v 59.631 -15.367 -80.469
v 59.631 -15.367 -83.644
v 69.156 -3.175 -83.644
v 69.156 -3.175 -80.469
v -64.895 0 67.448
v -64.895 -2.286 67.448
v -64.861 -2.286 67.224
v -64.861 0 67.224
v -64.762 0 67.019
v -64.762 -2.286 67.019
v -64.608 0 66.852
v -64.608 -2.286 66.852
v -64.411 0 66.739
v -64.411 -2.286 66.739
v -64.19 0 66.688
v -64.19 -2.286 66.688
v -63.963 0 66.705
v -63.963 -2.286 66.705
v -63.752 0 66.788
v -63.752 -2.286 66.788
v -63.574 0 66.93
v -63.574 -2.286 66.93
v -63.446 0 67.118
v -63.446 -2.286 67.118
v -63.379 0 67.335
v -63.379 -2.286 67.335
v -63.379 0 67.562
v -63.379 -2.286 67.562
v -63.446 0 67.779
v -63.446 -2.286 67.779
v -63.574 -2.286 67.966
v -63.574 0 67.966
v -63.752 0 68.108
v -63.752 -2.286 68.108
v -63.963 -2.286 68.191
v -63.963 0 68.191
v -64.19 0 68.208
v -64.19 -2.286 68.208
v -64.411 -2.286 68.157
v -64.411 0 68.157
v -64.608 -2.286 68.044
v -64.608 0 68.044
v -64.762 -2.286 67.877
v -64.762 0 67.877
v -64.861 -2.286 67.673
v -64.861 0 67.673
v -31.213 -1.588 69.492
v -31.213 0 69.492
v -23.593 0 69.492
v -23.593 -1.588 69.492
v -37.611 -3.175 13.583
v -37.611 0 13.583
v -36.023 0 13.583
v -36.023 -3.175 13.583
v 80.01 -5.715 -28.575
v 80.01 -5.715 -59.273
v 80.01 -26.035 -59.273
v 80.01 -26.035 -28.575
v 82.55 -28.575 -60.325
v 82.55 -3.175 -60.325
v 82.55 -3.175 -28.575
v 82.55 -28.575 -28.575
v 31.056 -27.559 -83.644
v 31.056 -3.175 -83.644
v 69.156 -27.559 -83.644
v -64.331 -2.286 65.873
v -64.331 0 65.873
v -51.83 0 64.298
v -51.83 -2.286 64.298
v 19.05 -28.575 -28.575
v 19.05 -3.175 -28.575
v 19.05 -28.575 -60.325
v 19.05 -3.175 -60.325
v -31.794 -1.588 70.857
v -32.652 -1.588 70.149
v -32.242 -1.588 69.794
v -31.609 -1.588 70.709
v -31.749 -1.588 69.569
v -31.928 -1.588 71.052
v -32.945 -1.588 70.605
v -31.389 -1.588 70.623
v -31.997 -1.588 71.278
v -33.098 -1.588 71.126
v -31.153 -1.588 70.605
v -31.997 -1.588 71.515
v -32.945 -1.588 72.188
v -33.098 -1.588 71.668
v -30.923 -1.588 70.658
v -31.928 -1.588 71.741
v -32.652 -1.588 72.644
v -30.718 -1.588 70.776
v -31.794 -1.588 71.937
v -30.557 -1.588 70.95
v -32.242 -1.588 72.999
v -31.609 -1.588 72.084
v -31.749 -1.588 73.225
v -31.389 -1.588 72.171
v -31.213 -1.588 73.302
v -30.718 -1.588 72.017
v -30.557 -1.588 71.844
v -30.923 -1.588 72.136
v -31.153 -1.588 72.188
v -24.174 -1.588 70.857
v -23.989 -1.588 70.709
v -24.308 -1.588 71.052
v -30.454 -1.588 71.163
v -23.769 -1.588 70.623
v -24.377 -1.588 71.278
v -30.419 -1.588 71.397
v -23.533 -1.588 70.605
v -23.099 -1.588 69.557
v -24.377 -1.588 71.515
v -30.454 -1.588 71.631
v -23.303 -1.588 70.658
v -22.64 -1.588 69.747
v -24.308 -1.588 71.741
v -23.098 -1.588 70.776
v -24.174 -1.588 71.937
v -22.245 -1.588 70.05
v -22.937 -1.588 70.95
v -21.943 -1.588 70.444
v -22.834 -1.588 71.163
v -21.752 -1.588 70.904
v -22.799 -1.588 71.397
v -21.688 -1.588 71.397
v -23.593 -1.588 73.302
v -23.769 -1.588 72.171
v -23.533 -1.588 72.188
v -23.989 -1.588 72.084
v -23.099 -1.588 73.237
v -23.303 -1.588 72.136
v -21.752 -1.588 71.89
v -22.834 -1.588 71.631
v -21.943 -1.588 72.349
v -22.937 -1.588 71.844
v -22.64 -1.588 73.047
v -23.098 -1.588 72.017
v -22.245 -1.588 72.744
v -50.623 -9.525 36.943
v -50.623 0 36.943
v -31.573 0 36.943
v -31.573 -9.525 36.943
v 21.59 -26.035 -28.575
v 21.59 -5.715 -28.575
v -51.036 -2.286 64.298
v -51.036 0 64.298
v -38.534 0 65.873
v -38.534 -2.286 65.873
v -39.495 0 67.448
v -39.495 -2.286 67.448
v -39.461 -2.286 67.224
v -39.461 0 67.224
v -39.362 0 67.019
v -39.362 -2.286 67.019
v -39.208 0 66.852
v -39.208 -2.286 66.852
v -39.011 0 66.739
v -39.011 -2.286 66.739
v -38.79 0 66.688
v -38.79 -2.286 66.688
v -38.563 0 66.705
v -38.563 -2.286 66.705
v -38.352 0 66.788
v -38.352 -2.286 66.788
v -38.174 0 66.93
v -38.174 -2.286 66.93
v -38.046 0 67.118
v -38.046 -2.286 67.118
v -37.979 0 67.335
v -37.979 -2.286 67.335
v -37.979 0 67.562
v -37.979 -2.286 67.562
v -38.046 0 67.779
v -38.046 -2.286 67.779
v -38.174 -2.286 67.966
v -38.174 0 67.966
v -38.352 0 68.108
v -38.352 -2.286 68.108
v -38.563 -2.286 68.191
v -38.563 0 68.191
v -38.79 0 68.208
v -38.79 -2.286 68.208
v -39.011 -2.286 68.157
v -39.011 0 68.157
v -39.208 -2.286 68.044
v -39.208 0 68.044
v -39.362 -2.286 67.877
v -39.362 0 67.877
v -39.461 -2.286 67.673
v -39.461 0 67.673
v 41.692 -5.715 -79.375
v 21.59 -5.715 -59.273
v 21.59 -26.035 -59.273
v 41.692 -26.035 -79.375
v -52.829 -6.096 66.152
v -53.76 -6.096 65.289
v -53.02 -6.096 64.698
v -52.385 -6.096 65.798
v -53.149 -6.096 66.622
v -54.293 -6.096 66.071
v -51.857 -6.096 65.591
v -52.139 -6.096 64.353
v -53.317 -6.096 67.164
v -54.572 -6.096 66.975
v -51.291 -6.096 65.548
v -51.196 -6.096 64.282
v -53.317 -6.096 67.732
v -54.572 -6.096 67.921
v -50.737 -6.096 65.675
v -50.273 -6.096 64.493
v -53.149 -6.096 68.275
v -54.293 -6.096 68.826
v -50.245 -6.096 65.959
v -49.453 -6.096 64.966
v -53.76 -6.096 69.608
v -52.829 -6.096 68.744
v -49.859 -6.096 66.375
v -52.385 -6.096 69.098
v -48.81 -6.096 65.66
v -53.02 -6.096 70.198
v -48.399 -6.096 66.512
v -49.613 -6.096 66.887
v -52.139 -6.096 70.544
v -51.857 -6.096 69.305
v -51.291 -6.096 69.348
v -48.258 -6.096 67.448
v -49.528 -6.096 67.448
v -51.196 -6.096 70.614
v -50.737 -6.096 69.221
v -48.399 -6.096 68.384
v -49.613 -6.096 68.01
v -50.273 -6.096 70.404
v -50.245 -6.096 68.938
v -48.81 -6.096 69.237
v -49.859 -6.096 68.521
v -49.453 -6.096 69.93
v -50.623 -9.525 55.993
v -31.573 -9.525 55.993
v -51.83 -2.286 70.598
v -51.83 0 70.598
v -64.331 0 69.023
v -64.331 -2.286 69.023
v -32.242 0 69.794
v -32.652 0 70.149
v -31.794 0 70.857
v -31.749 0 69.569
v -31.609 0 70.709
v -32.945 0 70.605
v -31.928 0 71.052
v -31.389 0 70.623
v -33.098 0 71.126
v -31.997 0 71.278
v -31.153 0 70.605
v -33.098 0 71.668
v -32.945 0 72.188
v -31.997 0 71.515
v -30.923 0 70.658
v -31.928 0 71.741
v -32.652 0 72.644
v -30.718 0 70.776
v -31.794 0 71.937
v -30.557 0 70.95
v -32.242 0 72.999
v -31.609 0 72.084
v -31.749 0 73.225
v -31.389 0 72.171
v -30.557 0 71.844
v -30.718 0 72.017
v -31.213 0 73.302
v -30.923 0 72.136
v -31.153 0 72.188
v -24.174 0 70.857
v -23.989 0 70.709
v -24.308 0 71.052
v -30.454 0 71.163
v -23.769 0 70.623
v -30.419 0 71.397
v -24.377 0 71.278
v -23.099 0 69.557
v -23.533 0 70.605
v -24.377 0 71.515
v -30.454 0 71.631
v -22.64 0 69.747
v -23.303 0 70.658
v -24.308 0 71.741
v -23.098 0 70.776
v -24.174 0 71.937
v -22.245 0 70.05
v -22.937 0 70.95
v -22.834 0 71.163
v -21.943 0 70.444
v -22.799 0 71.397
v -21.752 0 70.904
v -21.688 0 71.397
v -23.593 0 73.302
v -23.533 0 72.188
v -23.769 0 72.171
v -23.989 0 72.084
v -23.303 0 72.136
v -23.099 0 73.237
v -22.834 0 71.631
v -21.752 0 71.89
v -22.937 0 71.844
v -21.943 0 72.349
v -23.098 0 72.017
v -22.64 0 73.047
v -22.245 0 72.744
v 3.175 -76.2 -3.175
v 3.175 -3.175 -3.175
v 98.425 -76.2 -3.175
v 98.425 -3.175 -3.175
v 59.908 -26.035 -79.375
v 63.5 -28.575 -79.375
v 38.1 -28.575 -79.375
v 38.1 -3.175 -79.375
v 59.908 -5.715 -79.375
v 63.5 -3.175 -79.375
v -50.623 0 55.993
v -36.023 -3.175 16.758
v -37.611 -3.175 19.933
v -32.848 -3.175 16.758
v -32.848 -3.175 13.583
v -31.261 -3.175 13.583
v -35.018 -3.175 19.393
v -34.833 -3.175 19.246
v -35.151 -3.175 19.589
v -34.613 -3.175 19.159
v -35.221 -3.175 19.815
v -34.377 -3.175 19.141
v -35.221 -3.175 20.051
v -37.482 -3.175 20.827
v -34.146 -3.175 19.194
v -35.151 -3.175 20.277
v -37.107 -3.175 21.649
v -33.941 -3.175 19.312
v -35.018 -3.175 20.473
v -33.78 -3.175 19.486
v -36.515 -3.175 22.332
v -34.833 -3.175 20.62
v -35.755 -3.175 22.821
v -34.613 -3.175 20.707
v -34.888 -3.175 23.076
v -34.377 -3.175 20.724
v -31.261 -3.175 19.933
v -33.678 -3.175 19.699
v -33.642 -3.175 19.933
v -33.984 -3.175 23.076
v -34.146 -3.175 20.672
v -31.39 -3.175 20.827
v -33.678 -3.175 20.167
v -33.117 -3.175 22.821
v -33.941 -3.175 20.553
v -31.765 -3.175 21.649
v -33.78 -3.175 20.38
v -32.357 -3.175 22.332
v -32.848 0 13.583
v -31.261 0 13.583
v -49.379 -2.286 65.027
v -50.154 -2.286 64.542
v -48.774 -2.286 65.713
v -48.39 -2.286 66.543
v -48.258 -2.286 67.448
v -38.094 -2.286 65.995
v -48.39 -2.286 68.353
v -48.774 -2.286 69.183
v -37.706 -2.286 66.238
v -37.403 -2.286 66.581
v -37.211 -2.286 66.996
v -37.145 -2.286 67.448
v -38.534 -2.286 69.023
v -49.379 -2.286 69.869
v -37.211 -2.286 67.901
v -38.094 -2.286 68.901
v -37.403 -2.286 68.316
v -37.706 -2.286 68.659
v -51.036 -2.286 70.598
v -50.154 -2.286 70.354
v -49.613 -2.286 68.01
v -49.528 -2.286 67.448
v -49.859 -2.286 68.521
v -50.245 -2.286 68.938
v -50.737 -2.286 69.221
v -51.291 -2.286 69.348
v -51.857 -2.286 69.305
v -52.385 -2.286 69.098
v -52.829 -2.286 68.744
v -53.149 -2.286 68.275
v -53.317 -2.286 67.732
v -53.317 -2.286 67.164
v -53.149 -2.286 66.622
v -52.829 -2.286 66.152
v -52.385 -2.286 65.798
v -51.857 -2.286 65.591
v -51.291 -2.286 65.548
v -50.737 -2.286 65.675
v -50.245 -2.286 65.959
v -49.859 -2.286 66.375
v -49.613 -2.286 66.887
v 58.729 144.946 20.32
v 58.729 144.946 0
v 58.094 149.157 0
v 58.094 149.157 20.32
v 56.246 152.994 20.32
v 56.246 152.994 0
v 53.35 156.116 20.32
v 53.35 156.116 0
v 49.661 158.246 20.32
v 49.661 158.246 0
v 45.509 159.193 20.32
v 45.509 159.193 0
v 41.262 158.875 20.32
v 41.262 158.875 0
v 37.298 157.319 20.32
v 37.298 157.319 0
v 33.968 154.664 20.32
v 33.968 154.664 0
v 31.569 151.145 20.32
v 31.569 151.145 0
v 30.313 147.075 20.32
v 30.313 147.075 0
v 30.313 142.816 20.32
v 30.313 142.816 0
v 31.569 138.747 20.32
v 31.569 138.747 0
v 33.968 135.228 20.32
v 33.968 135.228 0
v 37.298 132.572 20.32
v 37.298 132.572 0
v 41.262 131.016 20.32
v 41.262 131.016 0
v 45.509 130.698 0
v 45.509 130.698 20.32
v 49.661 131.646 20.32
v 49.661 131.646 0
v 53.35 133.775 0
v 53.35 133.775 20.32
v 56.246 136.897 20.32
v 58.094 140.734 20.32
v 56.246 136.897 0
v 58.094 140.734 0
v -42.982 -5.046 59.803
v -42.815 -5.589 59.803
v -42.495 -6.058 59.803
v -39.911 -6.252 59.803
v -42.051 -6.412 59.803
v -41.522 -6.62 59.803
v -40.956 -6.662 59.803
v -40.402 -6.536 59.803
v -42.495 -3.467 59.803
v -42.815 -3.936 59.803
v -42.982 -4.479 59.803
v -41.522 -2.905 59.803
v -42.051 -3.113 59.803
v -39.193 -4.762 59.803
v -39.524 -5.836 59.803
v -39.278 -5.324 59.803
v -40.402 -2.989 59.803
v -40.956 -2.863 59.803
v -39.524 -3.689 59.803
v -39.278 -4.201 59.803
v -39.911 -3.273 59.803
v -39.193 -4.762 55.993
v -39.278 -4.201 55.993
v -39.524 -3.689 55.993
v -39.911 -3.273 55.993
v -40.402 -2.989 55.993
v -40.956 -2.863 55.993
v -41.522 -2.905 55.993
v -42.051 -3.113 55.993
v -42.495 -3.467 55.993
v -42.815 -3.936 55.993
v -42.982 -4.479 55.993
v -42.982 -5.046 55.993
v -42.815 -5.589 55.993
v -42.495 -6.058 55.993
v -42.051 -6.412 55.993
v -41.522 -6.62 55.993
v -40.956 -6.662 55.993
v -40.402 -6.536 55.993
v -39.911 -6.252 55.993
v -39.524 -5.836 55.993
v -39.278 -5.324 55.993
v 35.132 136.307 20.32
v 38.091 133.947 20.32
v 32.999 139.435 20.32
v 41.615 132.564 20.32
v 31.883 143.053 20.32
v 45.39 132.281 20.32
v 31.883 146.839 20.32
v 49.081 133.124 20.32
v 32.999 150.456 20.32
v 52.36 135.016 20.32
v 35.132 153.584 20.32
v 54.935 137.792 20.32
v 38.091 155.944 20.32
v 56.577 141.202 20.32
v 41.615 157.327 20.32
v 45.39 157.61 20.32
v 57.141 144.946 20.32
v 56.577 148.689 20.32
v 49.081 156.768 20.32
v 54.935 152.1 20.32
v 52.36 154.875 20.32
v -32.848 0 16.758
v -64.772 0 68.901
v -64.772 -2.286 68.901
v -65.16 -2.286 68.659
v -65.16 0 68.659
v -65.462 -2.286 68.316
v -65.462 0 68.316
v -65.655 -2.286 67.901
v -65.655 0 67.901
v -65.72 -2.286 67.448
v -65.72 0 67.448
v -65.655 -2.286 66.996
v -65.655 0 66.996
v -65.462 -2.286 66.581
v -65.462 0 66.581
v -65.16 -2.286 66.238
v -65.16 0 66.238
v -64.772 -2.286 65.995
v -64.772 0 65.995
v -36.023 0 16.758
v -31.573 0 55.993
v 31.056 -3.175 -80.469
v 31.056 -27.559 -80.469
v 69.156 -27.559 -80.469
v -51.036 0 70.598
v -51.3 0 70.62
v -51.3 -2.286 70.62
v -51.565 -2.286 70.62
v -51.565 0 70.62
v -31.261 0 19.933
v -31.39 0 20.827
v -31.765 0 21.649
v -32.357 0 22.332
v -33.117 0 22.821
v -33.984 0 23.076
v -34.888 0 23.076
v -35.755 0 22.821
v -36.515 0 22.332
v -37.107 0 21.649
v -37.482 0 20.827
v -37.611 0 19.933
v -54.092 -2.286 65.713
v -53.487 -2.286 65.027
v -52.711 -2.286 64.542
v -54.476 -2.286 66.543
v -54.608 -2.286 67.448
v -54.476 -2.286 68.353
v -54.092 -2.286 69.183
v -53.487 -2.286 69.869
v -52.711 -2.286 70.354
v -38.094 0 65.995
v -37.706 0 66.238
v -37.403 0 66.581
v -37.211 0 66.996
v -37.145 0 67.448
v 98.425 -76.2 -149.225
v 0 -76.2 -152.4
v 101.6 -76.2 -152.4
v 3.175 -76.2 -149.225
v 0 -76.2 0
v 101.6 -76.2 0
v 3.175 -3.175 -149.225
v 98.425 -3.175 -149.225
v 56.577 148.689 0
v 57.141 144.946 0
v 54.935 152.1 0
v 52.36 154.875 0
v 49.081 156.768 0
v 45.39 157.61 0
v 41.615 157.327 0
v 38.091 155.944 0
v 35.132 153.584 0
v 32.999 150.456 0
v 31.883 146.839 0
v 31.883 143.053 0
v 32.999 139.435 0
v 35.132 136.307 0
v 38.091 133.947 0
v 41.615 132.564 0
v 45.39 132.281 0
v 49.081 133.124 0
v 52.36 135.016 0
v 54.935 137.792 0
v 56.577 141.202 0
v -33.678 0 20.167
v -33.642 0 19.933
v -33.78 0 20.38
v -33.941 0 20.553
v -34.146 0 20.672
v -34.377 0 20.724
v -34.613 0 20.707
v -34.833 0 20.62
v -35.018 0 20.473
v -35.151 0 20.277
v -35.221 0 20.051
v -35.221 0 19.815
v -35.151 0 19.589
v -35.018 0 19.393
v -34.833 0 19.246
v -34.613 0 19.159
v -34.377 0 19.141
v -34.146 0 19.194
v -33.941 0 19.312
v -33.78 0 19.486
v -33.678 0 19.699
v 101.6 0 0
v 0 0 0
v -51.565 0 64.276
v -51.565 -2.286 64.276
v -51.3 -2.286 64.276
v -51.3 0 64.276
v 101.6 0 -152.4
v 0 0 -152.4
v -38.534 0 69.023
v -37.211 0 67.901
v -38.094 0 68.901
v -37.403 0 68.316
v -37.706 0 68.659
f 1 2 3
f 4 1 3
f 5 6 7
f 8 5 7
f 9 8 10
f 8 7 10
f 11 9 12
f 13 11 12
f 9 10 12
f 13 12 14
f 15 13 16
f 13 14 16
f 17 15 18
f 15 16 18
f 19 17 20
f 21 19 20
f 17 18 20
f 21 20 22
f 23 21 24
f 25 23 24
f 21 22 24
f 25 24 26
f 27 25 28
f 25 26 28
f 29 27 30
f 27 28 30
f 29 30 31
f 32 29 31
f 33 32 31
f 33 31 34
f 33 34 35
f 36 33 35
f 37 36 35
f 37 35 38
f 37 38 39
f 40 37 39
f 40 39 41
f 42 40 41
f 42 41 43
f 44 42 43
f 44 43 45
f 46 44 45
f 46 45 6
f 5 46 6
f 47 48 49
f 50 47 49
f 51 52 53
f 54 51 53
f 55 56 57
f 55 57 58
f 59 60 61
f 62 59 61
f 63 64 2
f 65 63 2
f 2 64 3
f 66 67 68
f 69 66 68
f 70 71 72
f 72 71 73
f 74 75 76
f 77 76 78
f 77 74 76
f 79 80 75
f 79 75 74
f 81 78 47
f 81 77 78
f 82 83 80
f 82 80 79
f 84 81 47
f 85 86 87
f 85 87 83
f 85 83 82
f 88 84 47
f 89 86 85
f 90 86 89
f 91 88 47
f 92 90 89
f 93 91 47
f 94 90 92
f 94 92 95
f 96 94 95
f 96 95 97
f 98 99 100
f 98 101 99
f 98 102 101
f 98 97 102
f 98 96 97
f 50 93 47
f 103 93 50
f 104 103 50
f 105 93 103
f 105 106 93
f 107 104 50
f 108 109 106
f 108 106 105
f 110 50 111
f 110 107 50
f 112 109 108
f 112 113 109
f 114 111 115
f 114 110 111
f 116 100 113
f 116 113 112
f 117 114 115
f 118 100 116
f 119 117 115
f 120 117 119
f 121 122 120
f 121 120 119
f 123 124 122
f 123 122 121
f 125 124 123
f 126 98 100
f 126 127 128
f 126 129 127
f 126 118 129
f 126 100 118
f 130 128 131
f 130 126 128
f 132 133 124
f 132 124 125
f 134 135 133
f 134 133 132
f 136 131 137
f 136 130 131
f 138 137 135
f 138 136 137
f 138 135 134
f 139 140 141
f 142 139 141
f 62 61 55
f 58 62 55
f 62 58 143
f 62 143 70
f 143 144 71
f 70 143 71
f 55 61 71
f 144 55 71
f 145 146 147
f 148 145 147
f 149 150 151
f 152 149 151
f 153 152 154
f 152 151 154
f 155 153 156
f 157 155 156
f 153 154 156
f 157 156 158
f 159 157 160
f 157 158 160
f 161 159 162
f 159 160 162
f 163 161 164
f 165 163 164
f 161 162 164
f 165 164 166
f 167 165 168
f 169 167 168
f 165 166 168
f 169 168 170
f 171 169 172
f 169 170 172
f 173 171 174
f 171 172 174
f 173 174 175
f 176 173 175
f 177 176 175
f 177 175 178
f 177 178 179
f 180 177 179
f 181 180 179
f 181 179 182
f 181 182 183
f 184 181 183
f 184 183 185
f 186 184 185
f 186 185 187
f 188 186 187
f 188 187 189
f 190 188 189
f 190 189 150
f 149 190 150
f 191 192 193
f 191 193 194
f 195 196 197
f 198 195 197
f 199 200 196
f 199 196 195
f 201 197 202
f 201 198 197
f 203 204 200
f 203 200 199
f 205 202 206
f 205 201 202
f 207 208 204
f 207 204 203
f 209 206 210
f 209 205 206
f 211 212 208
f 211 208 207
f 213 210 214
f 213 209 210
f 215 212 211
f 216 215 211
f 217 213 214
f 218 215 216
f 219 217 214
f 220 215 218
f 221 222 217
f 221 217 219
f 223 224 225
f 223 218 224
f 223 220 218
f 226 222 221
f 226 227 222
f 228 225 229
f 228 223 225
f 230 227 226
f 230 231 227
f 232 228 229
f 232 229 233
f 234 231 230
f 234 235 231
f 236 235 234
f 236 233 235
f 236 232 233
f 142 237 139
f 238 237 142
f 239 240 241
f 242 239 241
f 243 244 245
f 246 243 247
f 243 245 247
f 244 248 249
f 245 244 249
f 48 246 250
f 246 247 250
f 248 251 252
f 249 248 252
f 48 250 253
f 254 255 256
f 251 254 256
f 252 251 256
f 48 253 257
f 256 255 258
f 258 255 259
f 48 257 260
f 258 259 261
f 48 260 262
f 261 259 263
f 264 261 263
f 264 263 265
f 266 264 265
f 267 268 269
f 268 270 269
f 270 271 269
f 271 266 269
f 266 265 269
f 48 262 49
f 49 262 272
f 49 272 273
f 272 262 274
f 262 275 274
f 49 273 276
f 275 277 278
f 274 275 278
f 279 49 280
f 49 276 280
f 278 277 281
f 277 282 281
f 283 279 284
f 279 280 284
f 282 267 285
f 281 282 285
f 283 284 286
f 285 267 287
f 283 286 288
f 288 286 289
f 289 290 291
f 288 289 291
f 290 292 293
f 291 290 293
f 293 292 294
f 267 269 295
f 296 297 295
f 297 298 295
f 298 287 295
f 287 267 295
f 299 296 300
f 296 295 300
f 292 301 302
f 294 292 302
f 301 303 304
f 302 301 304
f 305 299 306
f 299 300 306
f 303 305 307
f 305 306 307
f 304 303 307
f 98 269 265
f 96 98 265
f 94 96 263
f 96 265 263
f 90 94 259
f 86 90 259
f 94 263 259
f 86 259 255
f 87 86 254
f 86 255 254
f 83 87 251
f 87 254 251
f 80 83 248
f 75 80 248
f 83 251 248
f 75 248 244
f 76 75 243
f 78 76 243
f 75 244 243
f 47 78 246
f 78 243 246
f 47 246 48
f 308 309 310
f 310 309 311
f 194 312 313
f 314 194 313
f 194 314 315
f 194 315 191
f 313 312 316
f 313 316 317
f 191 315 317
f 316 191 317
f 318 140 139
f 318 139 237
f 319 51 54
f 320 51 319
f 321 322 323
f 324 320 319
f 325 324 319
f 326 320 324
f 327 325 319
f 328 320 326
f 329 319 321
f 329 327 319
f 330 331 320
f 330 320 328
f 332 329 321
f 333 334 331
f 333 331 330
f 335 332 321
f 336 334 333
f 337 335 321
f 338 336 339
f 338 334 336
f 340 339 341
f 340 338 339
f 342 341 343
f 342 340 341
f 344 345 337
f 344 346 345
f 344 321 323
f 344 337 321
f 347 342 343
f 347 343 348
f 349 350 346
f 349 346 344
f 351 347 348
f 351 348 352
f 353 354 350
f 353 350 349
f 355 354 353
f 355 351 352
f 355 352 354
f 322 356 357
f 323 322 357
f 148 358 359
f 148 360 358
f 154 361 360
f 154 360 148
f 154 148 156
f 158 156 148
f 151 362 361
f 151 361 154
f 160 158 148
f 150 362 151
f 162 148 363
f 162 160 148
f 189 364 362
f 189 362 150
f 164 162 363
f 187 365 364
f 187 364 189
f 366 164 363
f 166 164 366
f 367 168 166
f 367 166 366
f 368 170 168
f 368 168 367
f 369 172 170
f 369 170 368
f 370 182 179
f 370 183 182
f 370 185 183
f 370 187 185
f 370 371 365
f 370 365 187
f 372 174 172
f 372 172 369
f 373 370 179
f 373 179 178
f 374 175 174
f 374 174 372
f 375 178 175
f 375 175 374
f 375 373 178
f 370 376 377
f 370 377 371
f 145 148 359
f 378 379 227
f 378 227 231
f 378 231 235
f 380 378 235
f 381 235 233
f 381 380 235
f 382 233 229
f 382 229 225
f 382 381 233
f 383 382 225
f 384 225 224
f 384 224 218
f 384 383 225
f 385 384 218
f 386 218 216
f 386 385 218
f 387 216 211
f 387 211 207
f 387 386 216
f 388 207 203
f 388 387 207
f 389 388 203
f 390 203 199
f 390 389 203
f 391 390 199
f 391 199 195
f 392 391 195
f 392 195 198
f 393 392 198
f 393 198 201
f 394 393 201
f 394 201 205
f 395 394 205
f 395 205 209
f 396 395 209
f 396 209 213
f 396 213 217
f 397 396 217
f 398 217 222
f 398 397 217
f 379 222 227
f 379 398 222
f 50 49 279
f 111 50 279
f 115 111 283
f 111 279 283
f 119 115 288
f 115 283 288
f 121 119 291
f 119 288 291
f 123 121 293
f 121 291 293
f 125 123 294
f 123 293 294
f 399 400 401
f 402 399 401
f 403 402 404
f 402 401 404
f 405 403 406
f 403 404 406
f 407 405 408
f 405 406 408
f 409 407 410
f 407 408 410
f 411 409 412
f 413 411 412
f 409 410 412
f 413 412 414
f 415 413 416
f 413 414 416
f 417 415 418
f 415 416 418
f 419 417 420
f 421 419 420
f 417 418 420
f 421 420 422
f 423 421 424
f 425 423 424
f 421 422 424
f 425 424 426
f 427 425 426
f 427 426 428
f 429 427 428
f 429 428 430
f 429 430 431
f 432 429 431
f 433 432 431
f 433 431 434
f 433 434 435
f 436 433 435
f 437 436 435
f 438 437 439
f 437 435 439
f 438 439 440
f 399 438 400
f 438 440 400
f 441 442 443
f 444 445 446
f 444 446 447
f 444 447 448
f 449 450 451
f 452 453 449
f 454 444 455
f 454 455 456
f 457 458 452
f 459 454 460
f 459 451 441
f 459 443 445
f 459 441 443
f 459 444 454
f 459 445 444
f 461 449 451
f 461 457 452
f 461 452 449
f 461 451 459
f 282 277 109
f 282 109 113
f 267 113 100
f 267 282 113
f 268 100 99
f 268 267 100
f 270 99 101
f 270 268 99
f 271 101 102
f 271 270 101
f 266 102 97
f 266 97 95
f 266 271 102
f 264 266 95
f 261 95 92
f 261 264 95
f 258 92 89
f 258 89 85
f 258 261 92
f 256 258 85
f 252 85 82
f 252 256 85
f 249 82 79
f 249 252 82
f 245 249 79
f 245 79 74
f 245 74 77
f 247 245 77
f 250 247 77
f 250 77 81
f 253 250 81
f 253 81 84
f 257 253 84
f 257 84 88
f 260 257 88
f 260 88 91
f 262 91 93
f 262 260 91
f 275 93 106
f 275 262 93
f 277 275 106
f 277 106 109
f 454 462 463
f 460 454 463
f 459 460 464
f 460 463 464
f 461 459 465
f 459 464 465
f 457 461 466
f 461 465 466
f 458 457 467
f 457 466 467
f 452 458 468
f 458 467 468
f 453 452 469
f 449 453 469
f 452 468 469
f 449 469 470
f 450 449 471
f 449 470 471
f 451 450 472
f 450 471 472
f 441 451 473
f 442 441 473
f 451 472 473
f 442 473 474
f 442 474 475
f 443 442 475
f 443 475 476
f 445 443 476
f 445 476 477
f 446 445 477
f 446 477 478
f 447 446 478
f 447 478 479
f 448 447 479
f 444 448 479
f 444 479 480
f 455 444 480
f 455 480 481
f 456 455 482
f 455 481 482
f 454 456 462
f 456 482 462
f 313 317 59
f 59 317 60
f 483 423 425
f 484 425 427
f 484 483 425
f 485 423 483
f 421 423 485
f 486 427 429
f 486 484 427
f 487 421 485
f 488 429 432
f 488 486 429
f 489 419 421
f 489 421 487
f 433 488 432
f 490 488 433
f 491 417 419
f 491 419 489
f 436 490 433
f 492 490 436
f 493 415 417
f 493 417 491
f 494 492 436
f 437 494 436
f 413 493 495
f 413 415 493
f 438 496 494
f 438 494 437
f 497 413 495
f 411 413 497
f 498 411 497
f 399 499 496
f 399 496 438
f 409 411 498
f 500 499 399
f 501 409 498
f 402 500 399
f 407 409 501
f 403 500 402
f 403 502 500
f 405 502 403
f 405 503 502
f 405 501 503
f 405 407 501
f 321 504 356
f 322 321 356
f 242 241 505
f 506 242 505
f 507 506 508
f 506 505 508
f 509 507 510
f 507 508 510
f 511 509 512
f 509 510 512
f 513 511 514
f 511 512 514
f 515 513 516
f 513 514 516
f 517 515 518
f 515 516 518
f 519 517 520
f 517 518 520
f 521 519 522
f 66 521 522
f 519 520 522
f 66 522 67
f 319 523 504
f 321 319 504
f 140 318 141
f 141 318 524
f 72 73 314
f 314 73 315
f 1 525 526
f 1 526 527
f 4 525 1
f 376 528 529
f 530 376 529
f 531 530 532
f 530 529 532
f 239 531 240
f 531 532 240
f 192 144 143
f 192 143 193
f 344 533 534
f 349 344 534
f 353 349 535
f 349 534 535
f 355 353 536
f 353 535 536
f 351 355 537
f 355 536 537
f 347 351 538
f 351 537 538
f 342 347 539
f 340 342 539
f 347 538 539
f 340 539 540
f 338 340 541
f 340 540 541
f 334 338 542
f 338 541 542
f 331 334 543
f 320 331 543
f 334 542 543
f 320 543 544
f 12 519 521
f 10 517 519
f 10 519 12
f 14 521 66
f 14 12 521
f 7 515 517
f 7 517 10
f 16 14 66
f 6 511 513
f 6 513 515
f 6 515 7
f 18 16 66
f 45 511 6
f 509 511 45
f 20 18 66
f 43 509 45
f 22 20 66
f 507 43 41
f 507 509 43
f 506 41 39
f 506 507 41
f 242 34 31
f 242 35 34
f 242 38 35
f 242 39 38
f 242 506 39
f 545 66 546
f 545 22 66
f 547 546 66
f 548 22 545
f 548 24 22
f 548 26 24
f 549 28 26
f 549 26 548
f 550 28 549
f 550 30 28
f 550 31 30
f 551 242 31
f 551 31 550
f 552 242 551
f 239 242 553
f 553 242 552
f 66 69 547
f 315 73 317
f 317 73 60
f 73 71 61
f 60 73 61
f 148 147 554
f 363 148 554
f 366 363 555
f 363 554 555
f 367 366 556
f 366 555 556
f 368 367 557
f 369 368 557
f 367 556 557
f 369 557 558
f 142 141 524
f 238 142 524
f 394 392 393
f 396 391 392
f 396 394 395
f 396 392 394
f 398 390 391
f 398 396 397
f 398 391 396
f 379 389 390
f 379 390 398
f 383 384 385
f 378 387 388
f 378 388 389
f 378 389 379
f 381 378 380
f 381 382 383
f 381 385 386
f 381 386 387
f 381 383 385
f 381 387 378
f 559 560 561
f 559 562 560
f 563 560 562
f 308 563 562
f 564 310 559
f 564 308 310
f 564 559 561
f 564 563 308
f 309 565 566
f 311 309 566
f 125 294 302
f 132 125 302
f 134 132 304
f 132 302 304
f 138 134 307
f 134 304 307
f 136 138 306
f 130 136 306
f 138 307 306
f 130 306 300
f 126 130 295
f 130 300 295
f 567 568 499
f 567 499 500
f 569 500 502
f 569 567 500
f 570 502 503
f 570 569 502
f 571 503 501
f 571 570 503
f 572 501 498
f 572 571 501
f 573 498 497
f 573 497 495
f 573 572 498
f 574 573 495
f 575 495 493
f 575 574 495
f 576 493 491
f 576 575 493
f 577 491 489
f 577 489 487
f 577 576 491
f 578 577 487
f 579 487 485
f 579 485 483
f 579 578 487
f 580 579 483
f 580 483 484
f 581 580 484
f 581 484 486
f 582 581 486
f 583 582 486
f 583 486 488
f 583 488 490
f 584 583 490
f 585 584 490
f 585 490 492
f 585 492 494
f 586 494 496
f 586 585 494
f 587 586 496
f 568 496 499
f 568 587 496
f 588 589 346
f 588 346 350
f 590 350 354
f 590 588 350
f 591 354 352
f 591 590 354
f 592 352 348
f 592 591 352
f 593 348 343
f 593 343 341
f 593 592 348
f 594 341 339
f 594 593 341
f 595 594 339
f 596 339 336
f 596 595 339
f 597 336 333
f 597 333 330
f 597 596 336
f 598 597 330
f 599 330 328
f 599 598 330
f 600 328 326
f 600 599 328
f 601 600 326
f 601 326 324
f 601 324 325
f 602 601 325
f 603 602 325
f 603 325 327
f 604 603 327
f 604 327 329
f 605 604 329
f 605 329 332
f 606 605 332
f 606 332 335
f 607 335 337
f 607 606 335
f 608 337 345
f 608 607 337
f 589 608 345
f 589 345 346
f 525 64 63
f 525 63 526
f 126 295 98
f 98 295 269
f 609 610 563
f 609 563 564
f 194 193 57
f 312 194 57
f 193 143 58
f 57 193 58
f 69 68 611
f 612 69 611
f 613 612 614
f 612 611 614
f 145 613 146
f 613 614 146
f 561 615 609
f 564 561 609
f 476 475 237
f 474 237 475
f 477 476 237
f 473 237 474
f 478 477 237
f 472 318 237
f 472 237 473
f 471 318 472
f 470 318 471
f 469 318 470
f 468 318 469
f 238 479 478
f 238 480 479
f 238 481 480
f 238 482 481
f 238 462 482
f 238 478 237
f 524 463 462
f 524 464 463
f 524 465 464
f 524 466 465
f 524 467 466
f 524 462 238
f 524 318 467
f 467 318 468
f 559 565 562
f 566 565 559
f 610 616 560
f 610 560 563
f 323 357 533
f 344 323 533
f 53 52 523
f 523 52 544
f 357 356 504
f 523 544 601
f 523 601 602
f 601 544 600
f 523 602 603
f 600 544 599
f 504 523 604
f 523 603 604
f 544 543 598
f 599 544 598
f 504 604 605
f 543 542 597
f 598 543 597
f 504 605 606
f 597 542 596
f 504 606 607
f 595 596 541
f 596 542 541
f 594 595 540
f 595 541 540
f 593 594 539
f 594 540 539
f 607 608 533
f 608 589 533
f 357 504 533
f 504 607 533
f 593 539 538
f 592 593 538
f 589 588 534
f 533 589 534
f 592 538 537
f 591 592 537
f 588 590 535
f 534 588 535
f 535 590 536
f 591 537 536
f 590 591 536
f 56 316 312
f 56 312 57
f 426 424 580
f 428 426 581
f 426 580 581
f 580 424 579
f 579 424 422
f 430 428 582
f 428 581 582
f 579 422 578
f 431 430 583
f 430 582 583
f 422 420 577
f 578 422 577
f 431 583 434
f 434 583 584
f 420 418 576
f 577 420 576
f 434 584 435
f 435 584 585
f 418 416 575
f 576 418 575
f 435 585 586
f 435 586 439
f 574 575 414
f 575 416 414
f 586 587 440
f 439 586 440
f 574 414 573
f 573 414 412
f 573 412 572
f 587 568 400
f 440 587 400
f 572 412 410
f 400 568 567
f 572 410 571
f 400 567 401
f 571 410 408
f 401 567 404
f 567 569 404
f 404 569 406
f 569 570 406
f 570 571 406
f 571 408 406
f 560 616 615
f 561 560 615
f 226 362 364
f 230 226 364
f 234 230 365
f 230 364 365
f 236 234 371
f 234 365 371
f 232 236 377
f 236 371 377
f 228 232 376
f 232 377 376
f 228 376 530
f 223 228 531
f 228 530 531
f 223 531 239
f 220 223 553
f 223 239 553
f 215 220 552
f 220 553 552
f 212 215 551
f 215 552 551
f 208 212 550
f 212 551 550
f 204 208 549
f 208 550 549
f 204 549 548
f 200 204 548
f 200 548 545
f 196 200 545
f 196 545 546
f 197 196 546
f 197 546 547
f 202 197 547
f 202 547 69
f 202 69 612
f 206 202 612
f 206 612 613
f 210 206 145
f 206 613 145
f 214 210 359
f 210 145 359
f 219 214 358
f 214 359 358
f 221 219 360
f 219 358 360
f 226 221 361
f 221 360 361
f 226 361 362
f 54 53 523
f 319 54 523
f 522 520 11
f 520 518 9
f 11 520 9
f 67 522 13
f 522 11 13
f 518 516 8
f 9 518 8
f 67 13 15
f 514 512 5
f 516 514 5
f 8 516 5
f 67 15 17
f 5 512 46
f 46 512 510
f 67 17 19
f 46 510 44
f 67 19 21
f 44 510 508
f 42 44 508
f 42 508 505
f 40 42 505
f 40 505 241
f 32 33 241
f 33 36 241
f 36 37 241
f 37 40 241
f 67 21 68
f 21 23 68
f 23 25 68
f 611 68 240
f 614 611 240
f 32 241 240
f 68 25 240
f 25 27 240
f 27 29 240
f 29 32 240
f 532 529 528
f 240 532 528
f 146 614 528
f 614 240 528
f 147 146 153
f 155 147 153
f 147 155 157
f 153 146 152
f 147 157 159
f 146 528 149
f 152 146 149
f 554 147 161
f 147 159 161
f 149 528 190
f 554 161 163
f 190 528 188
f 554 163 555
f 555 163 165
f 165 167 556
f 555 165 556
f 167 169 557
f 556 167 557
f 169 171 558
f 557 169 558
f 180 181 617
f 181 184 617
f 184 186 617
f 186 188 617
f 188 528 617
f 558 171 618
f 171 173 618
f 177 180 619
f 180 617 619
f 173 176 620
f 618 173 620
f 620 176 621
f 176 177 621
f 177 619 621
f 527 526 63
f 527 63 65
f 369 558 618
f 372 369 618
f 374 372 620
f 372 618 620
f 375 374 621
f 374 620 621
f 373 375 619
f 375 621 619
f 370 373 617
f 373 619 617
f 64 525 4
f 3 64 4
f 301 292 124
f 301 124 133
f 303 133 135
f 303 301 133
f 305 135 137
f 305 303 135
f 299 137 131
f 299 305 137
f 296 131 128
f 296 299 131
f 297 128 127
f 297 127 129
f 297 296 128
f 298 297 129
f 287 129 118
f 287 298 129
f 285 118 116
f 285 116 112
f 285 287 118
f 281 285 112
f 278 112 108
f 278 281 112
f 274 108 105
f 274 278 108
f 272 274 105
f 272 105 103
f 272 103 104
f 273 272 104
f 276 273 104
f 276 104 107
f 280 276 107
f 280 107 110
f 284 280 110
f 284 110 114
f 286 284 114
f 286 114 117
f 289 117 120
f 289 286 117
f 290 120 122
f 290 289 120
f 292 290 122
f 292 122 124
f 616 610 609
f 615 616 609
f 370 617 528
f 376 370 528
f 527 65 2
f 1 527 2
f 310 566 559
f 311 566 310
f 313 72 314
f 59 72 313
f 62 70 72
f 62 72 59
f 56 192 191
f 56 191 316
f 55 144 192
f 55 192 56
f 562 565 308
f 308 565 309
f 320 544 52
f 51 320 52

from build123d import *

# Parameters (mm, degrees)
F0_W      = 101.6
F0_H      = 152.4
F1_DEPTH  = 76.2
F2_T      = -3.175
F4_DEPTH  = 25.4
F5_T      = -2.54
F6_W      = 38.1
F6_H      = 3.175
F7_DEPTH  = 24.384
F9_DEPTH  = 3.175
F10_R     = 14.2875
F10_R_2   = 12.7
F11_DEPTH = 20.32
F12_R     = 0.79375
F13_DEPTH = 3.175
F14_W     = 19.05
F14_H     = 19.05
F15_DEPTH = 9.525
F16_R     = 1.905
F17_DEPTH = 3.81
F19_DEPTH = 2.286
F20_D     = 1.524
F21_R     = 3.175
F21_R_2   = 1.905
F22_DEPTH = 3.81
F23_R     = 0.79375
F24_DEPTH = 1.5875


with BuildPart() as f1:
    # F0 (on Front) → F1 (new body)
    with BuildSketch(Plane.XZ):
        with Locations((50.8, -76.2)):
            Rectangle(F0_W, F0_H)
    extrude(amount=F1_DEPTH)

    # F2
    f2_openings = [f1.faces().sort_by_distance(p)[0] for p in [
        (50.8, -76.2, -76.2),
    ]]
    offset(amount=F2_T, openings=f2_openings)


with BuildPart() as f4:
    # F3 (on face) → F4 (new body)
    with BuildSketch(Plane.XZ.offset(3.175)):
        Polygon((82.55, -28.575), (19.05, -28.575), (19.05, -60.325), (38.1, -79.375), (63.5, -79.375), (82.55, -60.325), align=None)
    extrude(amount=F4_DEPTH)

    # F5
    f5_openings = [f4.faces().sort_by_distance(p)[0] for p in [
        (50.8, -15.875, -28.575),
        (50.8, -15.875, -79.375),
    ]]
    offset(amount=F5_T, openings=f5_openings)


with BuildPart() as f7:
    # F6 (on face) → F7 (new body)
    with BuildSketch(Plane.XZ.offset(3.175)):
        with Locations((50.1062323436, -82.0561125875)):
            Rectangle(F6_W, F6_H)
    extrude(amount=F7_DEPTH)

    # F8 (on face) → F9 (cut, through all)
    with BuildSketch(Plane(origin=(0, 0, -83.6436125875), x_dir=(1, 0, 0), z_dir=(0, 0, -1))):
        Polygon((69.1562323436, 3.175), (69.1562323436, 27.559), (59.6312323436, 15.367), align=None)
    extrude(amount=-F9_DEPTH, mode=Mode.SUBTRACT)


with BuildPart() as f11:
    # F10 (on Top) → F11 (new body)
    with BuildSketch(Plane.XY):
        with Locations((44.4413982332, 144.9456810951)):
            Circle(F10_R)
        with Locations((44.4413982332, 144.9456810951)):
            Circle(F10_R_2, mode=Mode.SUBTRACT)
    extrude(amount=F11_DEPTH)


with BuildPart() as f13:
    # F12 (on Front) → F13 (new body)
    with BuildSketch(Plane.XZ):
        with BuildLine():
            Line((-37.6109989196, 19.9329089373), (-37.6109989196, 13.5829089373))
            Line((-37.6109989196, 13.5829089373), (-36.0234989196, 13.5829089373))
            Line((-36.0234989196, 13.5829089373), (-36.0234989196, 16.7579089373))
            Line((-36.0234989196, 16.7579089373), (-32.8484989196, 16.7579089373))
            Line((-32.8484989196, 16.7579089373), (-32.8484989196, 13.5829089373))
            Line((-32.8484989196, 13.5829089373), (-31.2609989196, 13.5829089373))
            Line((-31.2609989196, 13.5829089373), (-31.2609989196, 19.9329089373))
            ThreePointArc((-31.2609989196, 19.9329089373), (-34.4359989196, 23.1079089373), (-37.6109989196, 19.9329089373))
        make_face()
        with Locations((-34.4359989196, 19.9329089373)):
            Circle(F12_R, mode=Mode.SUBTRACT)
    extrude(amount=F13_DEPTH)


with BuildPart() as f15:
    # F14 (on Front) → F15 (new body)
    with BuildSketch(Plane.XZ):
        with Locations((-41.0984594887, 46.4677736163)):
            Rectangle(F14_W, F14_H)
    extrude(amount=F15_DEPTH)

    # F16 (on face) → F17 (join)
    with BuildSketch(Plane.XY.offset(55.9927736163)):
        with Locations((-41.0984594887, -4.7625)):
            Circle(F16_R)
    extrude(amount=F17_DEPTH)


with BuildPart() as f19:
    # F18 (on Front) → F19 (new body)
    with BuildSketch(Plane.XZ):
        with BuildLine():
            ThreePointArc((-51.0360050717, 64.2980251566), (-49.0516300717, 65.3480577082), (-48.2578800717, 67.4481228114))
            ThreePointArc((-48.2578800717, 67.4481228114), (-49.0516300717, 69.5481879145), (-51.0360050717, 70.5982204661))
            ThreePointArc((-51.0360050717, 70.5982204661), (-51.4328800717, 70.6231228114), (-51.8297550717, 70.5982204661))
            ThreePointArc((-51.8297550717, 70.5982204661), (-54.6078800717, 67.4481228114), (-51.8297550717, 64.2980251566))
            ThreePointArc((-51.8297550717, 64.2980251566), (-51.4328800717, 64.2731228114), (-51.0360050717, 64.2980251566))
        make_face()
        with BuildLine():
            ThreePointArc((-51.0360050717, 70.5982204661), (-49.0516300717, 69.5481879145), (-48.2578800717, 67.4481228114))
            ThreePointArc((-48.2578800717, 67.4481228114), (-49.0516300717, 65.3480577082), (-51.0360050717, 64.2980251566))
            Line((-51.0360050717, 64.2980251566), (-38.5344425717, 65.873073984))
            ThreePointArc((-38.5344425717, 65.873073984), (-40.3203800717, 67.4481228114), (-38.5344425717, 69.0231716387))
            Line((-38.5344425717, 69.0231716387), (-51.0360050717, 70.5982204661))
        make_face()
        with BuildLine():
            ThreePointArc((-51.8297550717, 64.2980251566), (-54.6078800717, 67.4481228114), (-51.8297550717, 70.5982204661))
            Line((-51.8297550717, 70.5982204661), (-64.3313175717, 69.0231716387))
            ThreePointArc((-64.3313175717, 69.0231716387), (-63.0828475201, 68.6387478114), (-62.5453800717, 67.4481228114))
            ThreePointArc((-62.5453800717, 67.4481228114), (-63.0828475201, 66.2574978114), (-64.3313175717, 65.873073984))
            Line((-64.3313175717, 65.873073984), (-51.8297550717, 64.2980251566))
        make_face()
        with BuildLine():
            ThreePointArc((-37.1453800717, 67.4481228114), (-37.5422550717, 68.4981553629), (-38.5344425717, 69.0231716387))
            ThreePointArc((-38.5344425717, 69.0231716387), (-40.3203800717, 67.4481228114), (-38.5344425717, 65.873073984))
            ThreePointArc((-38.5344425717, 65.873073984), (-37.5422550717, 66.3980902598), (-37.1453800717, 67.4481228114))
        make_face()
        with BuildLine():
            ThreePointArc((-62.5453800717, 67.4481228114), (-63.0828475201, 68.6387478114), (-64.3313175717, 69.0231716387))
            ThreePointArc((-64.3313175717, 69.0231716387), (-65.7203800717, 67.4481228114), (-64.3313175717, 65.873073984))
            ThreePointArc((-64.3313175717, 65.873073984), (-63.0828475201, 66.2574978114), (-62.5453800717, 67.4481228114))
        make_face()
    extrude(amount=F19_DEPTH)

    # F20 (through all)
    with Locations(Plane(origin=(0, 0, 0), x_dir=(1, 0, 0), z_dir=(0, 1, 0))):
        with Locations((-64.1328800717, -67.4481228114), (-38.7328800717, -67.4481228114)):
            Hole(F20_D / 2)

    # F21 (on face) → F22 (join)
    with BuildSketch(Plane.XZ.offset(2.286)):
        with Locations((-51.4328800717, 67.4481228114)):
            Circle(F21_R)
        with Locations((-51.4328800717, 67.4481228114)):
            Circle(F21_R_2, mode=Mode.SUBTRACT)
    extrude(amount=F22_DEPTH)


with BuildPart() as f24:
    # F23 (on Front) → F24 (new body)
    with BuildSketch(Plane.XZ):
        with BuildLine():
            ThreePointArc((-31.2125041177, 69.491771592), (-29.8654656996, 70.0497331738), (-29.3075041177, 71.396771592))
            ThreePointArc((-29.3075041177, 71.396771592), (-29.8654656996, 72.7438100101), (-31.2125041177, 73.301771592))
            ThreePointArc((-31.2125041177, 73.301771592), (-33.1175041177, 71.396771592), (-31.2125041177, 69.491771592))
        make_face()
        with Locations((-31.2125041177, 71.396771592)):
            Circle(F23_R, mode=Mode.SUBTRACT)
        with BuildLine():
            ThreePointArc((-31.2125041177, 73.301771592), (-29.8654656996, 72.7438100101), (-29.3075041177, 71.396771592))
            ThreePointArc((-29.3075041177, 71.396771592), (-29.8654656996, 70.0497331738), (-31.2125041177, 69.491771592))
            Line((-31.2125041177, 69.491771592), (-23.5925041177, 69.491771592))
            ThreePointArc((-23.5925041177, 69.491771592), (-25.4975041177, 71.396771592), (-23.5925041177, 73.301771592))
            Line((-23.5925041177, 73.301771592), (-31.2125041177, 73.301771592))
        make_face()
        with BuildLine():
            ThreePointArc((-21.6875041177, 71.396771592), (-22.2454656996, 72.7438100101), (-23.5925041177, 73.301771592))
            ThreePointArc((-23.5925041177, 73.301771592), (-25.4975041177, 71.396771592), (-23.5925041177, 69.491771592))
            ThreePointArc((-23.5925041177, 69.491771592), (-22.2454656996, 70.0497331738), (-21.6875041177, 71.396771592))
        make_face()
        with Locations((-23.5925041177, 71.396771592)):
            Circle(F23_R, mode=Mode.SUBTRACT)
    extrude(amount=F24_DEPTH)


solid = Compound([f1.part, f4.part, f7.part, f11.part, f13.part, f15.part, f19.part, f24.part])
